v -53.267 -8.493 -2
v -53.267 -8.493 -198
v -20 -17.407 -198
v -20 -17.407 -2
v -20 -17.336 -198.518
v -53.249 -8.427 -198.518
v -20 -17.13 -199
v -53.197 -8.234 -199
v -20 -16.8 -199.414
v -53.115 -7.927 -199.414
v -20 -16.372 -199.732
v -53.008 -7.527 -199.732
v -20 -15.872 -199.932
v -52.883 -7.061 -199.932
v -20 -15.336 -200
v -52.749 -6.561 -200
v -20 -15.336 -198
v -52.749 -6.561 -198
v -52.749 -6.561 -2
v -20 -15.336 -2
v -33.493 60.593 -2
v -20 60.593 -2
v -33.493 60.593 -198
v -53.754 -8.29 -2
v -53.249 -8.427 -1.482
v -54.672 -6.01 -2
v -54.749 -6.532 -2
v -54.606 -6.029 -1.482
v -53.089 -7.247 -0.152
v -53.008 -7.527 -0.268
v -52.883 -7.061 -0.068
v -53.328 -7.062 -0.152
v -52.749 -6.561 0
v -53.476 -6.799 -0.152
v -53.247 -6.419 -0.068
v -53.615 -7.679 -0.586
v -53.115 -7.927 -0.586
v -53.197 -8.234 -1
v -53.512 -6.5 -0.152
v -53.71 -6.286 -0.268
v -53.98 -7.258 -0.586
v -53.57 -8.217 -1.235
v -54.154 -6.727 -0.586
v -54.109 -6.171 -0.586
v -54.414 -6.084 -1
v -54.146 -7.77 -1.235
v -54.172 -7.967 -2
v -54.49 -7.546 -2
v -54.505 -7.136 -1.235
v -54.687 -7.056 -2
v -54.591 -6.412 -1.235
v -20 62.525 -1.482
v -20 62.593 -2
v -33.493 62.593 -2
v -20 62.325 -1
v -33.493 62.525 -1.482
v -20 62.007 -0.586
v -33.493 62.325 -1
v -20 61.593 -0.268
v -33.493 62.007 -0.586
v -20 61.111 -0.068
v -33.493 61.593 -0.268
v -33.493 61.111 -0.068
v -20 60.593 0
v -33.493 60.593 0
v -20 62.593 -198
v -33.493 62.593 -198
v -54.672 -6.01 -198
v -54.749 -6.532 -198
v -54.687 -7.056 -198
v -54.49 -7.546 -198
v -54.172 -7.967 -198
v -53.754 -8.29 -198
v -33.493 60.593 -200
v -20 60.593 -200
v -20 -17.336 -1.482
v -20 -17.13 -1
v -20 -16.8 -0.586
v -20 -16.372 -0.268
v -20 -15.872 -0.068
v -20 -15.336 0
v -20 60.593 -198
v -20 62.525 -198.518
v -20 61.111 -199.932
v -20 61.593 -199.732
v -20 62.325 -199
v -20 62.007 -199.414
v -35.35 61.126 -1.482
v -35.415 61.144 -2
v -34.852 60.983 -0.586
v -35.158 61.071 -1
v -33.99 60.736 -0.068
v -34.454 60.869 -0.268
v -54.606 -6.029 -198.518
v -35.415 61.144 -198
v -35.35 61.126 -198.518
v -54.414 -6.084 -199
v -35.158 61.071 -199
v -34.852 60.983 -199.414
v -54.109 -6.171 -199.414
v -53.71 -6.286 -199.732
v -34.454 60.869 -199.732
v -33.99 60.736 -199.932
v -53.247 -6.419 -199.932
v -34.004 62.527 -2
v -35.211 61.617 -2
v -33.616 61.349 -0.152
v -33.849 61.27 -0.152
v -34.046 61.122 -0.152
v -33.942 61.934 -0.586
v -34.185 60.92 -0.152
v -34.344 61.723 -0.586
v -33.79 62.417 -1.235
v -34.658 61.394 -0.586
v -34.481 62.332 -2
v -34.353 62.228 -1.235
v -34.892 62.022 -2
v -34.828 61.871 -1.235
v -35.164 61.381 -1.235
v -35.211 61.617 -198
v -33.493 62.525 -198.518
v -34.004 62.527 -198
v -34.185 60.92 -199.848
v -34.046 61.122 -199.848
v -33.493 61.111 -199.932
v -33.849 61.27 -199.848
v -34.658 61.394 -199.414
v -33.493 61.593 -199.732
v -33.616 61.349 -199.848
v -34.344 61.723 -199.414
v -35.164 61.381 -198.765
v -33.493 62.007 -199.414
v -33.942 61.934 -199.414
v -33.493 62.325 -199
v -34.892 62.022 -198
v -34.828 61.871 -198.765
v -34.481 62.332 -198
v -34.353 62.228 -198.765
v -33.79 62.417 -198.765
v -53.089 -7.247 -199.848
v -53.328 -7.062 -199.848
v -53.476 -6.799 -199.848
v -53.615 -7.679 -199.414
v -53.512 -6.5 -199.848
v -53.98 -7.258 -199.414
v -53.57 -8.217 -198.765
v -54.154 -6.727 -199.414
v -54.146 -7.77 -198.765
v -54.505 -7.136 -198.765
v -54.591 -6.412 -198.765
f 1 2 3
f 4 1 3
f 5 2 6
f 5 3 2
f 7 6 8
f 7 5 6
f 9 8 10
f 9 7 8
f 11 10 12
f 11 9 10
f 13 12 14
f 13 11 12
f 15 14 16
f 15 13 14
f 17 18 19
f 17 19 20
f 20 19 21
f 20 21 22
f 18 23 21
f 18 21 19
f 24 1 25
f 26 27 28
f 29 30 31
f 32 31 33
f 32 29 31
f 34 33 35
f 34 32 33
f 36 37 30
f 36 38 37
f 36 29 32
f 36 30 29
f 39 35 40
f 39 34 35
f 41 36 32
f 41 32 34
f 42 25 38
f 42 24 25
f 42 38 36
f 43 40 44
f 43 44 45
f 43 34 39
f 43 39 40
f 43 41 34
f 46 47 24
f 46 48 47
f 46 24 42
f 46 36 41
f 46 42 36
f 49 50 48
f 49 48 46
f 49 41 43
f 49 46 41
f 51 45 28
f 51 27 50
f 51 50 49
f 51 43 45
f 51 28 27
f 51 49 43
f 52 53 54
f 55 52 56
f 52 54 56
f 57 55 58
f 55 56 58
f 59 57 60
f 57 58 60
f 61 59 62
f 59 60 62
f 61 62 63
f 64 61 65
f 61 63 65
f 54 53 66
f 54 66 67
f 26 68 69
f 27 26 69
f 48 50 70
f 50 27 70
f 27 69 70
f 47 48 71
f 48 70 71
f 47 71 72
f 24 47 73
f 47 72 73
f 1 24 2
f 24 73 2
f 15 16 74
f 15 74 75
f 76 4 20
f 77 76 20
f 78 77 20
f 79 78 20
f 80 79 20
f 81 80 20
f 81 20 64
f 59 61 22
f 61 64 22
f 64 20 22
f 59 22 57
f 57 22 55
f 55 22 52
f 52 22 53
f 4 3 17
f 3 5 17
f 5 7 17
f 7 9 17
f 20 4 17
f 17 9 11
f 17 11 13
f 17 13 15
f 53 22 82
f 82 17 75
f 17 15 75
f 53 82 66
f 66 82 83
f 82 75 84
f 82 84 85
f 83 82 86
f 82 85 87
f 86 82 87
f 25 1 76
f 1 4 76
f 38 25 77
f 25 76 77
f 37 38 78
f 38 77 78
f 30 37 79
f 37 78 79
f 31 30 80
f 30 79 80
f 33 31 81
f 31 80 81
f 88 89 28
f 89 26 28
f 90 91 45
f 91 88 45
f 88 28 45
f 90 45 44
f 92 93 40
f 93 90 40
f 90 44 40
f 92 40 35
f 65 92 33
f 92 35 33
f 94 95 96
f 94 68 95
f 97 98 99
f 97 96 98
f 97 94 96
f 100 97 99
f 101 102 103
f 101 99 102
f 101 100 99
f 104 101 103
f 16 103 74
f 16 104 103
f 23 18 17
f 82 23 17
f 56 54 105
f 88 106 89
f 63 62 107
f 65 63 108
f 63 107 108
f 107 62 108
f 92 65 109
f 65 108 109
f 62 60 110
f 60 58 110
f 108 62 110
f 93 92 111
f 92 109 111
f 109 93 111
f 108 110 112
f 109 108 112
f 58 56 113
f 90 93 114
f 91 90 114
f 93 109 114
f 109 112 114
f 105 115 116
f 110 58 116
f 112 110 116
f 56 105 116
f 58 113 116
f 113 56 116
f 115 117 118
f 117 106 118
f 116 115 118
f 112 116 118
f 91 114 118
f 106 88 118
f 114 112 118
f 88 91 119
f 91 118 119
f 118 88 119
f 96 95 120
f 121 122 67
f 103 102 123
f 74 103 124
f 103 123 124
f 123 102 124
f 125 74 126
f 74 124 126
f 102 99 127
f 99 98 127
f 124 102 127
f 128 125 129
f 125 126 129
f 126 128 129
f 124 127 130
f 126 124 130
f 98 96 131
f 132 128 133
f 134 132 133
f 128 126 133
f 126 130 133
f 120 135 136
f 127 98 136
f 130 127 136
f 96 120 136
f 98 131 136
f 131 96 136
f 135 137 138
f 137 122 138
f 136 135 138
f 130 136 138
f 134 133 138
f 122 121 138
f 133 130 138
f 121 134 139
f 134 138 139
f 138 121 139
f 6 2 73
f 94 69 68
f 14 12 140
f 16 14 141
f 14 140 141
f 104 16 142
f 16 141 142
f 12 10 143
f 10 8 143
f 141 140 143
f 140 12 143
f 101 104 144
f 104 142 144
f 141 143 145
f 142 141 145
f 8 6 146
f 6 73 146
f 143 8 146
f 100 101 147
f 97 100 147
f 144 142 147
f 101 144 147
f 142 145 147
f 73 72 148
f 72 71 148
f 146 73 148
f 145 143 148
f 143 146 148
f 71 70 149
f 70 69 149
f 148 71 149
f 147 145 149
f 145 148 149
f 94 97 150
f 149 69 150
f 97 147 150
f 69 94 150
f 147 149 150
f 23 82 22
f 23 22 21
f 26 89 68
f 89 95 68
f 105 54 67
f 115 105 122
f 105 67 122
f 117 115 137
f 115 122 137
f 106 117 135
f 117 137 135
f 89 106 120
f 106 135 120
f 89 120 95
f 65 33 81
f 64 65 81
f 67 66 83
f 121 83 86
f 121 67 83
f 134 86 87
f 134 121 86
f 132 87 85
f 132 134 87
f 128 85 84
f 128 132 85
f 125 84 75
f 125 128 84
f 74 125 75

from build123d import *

# Parameters (mm, degrees)
FILLET2_R    = 2
SHELL2_START = -198
SHELL2_DEPTH = 196


# Read off the part's stored shape, not the designer's step: Shell2
with BuildPart() as part:
    # Sweep2: sweep along a path in Sketch6
    with BuildLine(Plane(origin=(0, 62.593086106, 0), x_dir=(1, 0, 0), z_dir=(0, 1, 0))) as sweep2_path:
        Line((-20, 0), (-20, 200))
    # Sketch5 → Sweep2 (sweep)
    with BuildSketch(Plane.XY):
        Polygon((-20, -17.406913894), (-20, 62.593086106), (-35, 62.593086106), (-55.232597818, -7.966367761), align=None)
    sweep(path=sweep2_path.line)

    # Fillet2
    fillet2_edges = [part.edges().sort_by_distance(p)[0] for p in [
        (-27.5, 62.593086106, 0),
        (-45.116298909, 27.313359172, 0),
        (-55.232597818, -7.966367761, -100),
        (-37.616298909, -12.686640828, -200),
        (-27.5, 62.593086106, -200),
        (-35, 62.593086106, -100),
        (-45.116298909, 27.313359172, -200),
        (-37.616298909, -12.686640828, 0),
    ]]
    fillet(fillet2_edges, radius=FILLET2_R)

    # Shell2 outline → Shell2 (cut)
    with BuildSketch(Plane.XY.offset(SHELL2_START)):
        Polygon((-52.749093204, -6.561268456), (-20, -15.336361533), (-20, 60.593086106), (-33.4928919, 60.593086106), align=None)
    extrude(amount=SHELL2_DEPTH, mode=Mode.SUBTRACT)


solid = part.part
